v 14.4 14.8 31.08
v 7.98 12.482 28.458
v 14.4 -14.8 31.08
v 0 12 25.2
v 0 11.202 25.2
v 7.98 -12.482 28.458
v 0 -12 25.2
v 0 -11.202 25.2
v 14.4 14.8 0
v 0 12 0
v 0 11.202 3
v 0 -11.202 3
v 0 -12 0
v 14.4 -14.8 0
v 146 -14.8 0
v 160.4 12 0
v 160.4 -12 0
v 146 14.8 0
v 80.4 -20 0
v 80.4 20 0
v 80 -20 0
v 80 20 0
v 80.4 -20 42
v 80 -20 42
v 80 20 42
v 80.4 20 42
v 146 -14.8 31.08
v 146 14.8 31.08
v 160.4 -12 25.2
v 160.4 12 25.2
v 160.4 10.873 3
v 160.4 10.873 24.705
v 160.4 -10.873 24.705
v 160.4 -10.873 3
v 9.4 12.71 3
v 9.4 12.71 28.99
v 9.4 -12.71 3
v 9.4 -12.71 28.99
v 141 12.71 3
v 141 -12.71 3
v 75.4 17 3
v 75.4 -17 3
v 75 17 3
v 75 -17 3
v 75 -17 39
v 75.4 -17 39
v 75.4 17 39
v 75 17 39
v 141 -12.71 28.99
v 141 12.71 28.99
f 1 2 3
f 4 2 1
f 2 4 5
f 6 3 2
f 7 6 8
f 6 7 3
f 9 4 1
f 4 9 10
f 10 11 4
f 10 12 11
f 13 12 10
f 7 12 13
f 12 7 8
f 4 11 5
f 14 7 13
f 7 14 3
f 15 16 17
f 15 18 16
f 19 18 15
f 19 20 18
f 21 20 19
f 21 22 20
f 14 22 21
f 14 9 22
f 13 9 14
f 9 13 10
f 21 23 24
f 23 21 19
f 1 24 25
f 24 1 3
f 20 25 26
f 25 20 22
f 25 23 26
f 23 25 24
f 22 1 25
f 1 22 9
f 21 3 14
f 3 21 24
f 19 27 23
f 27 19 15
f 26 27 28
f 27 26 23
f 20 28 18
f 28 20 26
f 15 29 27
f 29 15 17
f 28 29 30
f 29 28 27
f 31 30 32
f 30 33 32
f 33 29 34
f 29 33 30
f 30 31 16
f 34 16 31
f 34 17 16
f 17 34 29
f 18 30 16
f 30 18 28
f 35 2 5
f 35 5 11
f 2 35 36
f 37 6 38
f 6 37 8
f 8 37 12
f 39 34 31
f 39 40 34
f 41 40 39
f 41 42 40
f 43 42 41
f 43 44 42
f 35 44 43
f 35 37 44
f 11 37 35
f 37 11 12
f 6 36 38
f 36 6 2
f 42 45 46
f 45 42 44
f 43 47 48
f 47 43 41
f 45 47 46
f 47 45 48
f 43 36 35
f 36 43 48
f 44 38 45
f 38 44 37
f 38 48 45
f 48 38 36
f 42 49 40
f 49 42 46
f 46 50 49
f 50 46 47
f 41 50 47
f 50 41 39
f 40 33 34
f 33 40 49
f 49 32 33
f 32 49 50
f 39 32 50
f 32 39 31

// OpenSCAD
$fn = 32;

// ----------------------------------------------------------------------
// Faired channel: 160 x 40 x 42 mm, 3 mm walls, faired ends
// ----------------------------------------------------------------------

// --- parameters (mm) ---
length = 160;             // channel length
width = 40;               // channel width at mid length
height = 42;              // channel height at mid length
wall = 3;                 // side wall thickness
floor_t = 3;              // floor thickness
end_w = 24;               // faired end width
end_h = 25.2;             // faired end height

difference() {
  union() {
    hull() {
      translate([0, -12, 0]) cube([0.4, 24, 25.2]);
      translate([14.4, -14.8, 0]) cube([0.4, 29.6, 31.08]);
    }
    hull() {
      translate([14.4, -14.8, 0]) cube([0.4, 29.6, 31.08]);
      translate([80, -20, 0]) cube([0.4, 40, 42]);
    }
    hull() {
      translate([80, -20, 0]) cube([0.4, 40, 42]);
      translate([145.6, -14.8, 0]) cube([0.4, 29.6, 31.08]);
    }
    hull() {
      translate([145.6, -14.8, 0]) cube([0.4, 29.6, 31.08]);
      translate([160, -12, 0]) cube([0.4, 24, 25.2]);
    }
  }
  /* cavity, 5 mm proud of both ends so the ports are cut clean */
  hull() {
    translate([-5, -10.4, 3]) cube([0.4, 20.8, 20.6]);
    translate([9.4, -12.71, 3]) cube([0.4, 25.42, 25.99]);
  }
  hull() {
    translate([9.4, -12.71, 3]) cube([0.4, 25.42, 25.99]);
    translate([75, -17, 3]) cube([0.4, 34, 36]);
  }
  hull() {
    translate([75, -17, 3]) cube([0.4, 34, 36]);
    translate([140.6, -12.71, 3]) cube([0.4, 25.42, 25.99]);
  }
  hull() {
    translate([140.6, -12.71, 3]) cube([0.4, 25.42, 25.99]);
    translate([165, -10.4, 3]) cube([0.4, 20.8, 20.6]);
  }
}
